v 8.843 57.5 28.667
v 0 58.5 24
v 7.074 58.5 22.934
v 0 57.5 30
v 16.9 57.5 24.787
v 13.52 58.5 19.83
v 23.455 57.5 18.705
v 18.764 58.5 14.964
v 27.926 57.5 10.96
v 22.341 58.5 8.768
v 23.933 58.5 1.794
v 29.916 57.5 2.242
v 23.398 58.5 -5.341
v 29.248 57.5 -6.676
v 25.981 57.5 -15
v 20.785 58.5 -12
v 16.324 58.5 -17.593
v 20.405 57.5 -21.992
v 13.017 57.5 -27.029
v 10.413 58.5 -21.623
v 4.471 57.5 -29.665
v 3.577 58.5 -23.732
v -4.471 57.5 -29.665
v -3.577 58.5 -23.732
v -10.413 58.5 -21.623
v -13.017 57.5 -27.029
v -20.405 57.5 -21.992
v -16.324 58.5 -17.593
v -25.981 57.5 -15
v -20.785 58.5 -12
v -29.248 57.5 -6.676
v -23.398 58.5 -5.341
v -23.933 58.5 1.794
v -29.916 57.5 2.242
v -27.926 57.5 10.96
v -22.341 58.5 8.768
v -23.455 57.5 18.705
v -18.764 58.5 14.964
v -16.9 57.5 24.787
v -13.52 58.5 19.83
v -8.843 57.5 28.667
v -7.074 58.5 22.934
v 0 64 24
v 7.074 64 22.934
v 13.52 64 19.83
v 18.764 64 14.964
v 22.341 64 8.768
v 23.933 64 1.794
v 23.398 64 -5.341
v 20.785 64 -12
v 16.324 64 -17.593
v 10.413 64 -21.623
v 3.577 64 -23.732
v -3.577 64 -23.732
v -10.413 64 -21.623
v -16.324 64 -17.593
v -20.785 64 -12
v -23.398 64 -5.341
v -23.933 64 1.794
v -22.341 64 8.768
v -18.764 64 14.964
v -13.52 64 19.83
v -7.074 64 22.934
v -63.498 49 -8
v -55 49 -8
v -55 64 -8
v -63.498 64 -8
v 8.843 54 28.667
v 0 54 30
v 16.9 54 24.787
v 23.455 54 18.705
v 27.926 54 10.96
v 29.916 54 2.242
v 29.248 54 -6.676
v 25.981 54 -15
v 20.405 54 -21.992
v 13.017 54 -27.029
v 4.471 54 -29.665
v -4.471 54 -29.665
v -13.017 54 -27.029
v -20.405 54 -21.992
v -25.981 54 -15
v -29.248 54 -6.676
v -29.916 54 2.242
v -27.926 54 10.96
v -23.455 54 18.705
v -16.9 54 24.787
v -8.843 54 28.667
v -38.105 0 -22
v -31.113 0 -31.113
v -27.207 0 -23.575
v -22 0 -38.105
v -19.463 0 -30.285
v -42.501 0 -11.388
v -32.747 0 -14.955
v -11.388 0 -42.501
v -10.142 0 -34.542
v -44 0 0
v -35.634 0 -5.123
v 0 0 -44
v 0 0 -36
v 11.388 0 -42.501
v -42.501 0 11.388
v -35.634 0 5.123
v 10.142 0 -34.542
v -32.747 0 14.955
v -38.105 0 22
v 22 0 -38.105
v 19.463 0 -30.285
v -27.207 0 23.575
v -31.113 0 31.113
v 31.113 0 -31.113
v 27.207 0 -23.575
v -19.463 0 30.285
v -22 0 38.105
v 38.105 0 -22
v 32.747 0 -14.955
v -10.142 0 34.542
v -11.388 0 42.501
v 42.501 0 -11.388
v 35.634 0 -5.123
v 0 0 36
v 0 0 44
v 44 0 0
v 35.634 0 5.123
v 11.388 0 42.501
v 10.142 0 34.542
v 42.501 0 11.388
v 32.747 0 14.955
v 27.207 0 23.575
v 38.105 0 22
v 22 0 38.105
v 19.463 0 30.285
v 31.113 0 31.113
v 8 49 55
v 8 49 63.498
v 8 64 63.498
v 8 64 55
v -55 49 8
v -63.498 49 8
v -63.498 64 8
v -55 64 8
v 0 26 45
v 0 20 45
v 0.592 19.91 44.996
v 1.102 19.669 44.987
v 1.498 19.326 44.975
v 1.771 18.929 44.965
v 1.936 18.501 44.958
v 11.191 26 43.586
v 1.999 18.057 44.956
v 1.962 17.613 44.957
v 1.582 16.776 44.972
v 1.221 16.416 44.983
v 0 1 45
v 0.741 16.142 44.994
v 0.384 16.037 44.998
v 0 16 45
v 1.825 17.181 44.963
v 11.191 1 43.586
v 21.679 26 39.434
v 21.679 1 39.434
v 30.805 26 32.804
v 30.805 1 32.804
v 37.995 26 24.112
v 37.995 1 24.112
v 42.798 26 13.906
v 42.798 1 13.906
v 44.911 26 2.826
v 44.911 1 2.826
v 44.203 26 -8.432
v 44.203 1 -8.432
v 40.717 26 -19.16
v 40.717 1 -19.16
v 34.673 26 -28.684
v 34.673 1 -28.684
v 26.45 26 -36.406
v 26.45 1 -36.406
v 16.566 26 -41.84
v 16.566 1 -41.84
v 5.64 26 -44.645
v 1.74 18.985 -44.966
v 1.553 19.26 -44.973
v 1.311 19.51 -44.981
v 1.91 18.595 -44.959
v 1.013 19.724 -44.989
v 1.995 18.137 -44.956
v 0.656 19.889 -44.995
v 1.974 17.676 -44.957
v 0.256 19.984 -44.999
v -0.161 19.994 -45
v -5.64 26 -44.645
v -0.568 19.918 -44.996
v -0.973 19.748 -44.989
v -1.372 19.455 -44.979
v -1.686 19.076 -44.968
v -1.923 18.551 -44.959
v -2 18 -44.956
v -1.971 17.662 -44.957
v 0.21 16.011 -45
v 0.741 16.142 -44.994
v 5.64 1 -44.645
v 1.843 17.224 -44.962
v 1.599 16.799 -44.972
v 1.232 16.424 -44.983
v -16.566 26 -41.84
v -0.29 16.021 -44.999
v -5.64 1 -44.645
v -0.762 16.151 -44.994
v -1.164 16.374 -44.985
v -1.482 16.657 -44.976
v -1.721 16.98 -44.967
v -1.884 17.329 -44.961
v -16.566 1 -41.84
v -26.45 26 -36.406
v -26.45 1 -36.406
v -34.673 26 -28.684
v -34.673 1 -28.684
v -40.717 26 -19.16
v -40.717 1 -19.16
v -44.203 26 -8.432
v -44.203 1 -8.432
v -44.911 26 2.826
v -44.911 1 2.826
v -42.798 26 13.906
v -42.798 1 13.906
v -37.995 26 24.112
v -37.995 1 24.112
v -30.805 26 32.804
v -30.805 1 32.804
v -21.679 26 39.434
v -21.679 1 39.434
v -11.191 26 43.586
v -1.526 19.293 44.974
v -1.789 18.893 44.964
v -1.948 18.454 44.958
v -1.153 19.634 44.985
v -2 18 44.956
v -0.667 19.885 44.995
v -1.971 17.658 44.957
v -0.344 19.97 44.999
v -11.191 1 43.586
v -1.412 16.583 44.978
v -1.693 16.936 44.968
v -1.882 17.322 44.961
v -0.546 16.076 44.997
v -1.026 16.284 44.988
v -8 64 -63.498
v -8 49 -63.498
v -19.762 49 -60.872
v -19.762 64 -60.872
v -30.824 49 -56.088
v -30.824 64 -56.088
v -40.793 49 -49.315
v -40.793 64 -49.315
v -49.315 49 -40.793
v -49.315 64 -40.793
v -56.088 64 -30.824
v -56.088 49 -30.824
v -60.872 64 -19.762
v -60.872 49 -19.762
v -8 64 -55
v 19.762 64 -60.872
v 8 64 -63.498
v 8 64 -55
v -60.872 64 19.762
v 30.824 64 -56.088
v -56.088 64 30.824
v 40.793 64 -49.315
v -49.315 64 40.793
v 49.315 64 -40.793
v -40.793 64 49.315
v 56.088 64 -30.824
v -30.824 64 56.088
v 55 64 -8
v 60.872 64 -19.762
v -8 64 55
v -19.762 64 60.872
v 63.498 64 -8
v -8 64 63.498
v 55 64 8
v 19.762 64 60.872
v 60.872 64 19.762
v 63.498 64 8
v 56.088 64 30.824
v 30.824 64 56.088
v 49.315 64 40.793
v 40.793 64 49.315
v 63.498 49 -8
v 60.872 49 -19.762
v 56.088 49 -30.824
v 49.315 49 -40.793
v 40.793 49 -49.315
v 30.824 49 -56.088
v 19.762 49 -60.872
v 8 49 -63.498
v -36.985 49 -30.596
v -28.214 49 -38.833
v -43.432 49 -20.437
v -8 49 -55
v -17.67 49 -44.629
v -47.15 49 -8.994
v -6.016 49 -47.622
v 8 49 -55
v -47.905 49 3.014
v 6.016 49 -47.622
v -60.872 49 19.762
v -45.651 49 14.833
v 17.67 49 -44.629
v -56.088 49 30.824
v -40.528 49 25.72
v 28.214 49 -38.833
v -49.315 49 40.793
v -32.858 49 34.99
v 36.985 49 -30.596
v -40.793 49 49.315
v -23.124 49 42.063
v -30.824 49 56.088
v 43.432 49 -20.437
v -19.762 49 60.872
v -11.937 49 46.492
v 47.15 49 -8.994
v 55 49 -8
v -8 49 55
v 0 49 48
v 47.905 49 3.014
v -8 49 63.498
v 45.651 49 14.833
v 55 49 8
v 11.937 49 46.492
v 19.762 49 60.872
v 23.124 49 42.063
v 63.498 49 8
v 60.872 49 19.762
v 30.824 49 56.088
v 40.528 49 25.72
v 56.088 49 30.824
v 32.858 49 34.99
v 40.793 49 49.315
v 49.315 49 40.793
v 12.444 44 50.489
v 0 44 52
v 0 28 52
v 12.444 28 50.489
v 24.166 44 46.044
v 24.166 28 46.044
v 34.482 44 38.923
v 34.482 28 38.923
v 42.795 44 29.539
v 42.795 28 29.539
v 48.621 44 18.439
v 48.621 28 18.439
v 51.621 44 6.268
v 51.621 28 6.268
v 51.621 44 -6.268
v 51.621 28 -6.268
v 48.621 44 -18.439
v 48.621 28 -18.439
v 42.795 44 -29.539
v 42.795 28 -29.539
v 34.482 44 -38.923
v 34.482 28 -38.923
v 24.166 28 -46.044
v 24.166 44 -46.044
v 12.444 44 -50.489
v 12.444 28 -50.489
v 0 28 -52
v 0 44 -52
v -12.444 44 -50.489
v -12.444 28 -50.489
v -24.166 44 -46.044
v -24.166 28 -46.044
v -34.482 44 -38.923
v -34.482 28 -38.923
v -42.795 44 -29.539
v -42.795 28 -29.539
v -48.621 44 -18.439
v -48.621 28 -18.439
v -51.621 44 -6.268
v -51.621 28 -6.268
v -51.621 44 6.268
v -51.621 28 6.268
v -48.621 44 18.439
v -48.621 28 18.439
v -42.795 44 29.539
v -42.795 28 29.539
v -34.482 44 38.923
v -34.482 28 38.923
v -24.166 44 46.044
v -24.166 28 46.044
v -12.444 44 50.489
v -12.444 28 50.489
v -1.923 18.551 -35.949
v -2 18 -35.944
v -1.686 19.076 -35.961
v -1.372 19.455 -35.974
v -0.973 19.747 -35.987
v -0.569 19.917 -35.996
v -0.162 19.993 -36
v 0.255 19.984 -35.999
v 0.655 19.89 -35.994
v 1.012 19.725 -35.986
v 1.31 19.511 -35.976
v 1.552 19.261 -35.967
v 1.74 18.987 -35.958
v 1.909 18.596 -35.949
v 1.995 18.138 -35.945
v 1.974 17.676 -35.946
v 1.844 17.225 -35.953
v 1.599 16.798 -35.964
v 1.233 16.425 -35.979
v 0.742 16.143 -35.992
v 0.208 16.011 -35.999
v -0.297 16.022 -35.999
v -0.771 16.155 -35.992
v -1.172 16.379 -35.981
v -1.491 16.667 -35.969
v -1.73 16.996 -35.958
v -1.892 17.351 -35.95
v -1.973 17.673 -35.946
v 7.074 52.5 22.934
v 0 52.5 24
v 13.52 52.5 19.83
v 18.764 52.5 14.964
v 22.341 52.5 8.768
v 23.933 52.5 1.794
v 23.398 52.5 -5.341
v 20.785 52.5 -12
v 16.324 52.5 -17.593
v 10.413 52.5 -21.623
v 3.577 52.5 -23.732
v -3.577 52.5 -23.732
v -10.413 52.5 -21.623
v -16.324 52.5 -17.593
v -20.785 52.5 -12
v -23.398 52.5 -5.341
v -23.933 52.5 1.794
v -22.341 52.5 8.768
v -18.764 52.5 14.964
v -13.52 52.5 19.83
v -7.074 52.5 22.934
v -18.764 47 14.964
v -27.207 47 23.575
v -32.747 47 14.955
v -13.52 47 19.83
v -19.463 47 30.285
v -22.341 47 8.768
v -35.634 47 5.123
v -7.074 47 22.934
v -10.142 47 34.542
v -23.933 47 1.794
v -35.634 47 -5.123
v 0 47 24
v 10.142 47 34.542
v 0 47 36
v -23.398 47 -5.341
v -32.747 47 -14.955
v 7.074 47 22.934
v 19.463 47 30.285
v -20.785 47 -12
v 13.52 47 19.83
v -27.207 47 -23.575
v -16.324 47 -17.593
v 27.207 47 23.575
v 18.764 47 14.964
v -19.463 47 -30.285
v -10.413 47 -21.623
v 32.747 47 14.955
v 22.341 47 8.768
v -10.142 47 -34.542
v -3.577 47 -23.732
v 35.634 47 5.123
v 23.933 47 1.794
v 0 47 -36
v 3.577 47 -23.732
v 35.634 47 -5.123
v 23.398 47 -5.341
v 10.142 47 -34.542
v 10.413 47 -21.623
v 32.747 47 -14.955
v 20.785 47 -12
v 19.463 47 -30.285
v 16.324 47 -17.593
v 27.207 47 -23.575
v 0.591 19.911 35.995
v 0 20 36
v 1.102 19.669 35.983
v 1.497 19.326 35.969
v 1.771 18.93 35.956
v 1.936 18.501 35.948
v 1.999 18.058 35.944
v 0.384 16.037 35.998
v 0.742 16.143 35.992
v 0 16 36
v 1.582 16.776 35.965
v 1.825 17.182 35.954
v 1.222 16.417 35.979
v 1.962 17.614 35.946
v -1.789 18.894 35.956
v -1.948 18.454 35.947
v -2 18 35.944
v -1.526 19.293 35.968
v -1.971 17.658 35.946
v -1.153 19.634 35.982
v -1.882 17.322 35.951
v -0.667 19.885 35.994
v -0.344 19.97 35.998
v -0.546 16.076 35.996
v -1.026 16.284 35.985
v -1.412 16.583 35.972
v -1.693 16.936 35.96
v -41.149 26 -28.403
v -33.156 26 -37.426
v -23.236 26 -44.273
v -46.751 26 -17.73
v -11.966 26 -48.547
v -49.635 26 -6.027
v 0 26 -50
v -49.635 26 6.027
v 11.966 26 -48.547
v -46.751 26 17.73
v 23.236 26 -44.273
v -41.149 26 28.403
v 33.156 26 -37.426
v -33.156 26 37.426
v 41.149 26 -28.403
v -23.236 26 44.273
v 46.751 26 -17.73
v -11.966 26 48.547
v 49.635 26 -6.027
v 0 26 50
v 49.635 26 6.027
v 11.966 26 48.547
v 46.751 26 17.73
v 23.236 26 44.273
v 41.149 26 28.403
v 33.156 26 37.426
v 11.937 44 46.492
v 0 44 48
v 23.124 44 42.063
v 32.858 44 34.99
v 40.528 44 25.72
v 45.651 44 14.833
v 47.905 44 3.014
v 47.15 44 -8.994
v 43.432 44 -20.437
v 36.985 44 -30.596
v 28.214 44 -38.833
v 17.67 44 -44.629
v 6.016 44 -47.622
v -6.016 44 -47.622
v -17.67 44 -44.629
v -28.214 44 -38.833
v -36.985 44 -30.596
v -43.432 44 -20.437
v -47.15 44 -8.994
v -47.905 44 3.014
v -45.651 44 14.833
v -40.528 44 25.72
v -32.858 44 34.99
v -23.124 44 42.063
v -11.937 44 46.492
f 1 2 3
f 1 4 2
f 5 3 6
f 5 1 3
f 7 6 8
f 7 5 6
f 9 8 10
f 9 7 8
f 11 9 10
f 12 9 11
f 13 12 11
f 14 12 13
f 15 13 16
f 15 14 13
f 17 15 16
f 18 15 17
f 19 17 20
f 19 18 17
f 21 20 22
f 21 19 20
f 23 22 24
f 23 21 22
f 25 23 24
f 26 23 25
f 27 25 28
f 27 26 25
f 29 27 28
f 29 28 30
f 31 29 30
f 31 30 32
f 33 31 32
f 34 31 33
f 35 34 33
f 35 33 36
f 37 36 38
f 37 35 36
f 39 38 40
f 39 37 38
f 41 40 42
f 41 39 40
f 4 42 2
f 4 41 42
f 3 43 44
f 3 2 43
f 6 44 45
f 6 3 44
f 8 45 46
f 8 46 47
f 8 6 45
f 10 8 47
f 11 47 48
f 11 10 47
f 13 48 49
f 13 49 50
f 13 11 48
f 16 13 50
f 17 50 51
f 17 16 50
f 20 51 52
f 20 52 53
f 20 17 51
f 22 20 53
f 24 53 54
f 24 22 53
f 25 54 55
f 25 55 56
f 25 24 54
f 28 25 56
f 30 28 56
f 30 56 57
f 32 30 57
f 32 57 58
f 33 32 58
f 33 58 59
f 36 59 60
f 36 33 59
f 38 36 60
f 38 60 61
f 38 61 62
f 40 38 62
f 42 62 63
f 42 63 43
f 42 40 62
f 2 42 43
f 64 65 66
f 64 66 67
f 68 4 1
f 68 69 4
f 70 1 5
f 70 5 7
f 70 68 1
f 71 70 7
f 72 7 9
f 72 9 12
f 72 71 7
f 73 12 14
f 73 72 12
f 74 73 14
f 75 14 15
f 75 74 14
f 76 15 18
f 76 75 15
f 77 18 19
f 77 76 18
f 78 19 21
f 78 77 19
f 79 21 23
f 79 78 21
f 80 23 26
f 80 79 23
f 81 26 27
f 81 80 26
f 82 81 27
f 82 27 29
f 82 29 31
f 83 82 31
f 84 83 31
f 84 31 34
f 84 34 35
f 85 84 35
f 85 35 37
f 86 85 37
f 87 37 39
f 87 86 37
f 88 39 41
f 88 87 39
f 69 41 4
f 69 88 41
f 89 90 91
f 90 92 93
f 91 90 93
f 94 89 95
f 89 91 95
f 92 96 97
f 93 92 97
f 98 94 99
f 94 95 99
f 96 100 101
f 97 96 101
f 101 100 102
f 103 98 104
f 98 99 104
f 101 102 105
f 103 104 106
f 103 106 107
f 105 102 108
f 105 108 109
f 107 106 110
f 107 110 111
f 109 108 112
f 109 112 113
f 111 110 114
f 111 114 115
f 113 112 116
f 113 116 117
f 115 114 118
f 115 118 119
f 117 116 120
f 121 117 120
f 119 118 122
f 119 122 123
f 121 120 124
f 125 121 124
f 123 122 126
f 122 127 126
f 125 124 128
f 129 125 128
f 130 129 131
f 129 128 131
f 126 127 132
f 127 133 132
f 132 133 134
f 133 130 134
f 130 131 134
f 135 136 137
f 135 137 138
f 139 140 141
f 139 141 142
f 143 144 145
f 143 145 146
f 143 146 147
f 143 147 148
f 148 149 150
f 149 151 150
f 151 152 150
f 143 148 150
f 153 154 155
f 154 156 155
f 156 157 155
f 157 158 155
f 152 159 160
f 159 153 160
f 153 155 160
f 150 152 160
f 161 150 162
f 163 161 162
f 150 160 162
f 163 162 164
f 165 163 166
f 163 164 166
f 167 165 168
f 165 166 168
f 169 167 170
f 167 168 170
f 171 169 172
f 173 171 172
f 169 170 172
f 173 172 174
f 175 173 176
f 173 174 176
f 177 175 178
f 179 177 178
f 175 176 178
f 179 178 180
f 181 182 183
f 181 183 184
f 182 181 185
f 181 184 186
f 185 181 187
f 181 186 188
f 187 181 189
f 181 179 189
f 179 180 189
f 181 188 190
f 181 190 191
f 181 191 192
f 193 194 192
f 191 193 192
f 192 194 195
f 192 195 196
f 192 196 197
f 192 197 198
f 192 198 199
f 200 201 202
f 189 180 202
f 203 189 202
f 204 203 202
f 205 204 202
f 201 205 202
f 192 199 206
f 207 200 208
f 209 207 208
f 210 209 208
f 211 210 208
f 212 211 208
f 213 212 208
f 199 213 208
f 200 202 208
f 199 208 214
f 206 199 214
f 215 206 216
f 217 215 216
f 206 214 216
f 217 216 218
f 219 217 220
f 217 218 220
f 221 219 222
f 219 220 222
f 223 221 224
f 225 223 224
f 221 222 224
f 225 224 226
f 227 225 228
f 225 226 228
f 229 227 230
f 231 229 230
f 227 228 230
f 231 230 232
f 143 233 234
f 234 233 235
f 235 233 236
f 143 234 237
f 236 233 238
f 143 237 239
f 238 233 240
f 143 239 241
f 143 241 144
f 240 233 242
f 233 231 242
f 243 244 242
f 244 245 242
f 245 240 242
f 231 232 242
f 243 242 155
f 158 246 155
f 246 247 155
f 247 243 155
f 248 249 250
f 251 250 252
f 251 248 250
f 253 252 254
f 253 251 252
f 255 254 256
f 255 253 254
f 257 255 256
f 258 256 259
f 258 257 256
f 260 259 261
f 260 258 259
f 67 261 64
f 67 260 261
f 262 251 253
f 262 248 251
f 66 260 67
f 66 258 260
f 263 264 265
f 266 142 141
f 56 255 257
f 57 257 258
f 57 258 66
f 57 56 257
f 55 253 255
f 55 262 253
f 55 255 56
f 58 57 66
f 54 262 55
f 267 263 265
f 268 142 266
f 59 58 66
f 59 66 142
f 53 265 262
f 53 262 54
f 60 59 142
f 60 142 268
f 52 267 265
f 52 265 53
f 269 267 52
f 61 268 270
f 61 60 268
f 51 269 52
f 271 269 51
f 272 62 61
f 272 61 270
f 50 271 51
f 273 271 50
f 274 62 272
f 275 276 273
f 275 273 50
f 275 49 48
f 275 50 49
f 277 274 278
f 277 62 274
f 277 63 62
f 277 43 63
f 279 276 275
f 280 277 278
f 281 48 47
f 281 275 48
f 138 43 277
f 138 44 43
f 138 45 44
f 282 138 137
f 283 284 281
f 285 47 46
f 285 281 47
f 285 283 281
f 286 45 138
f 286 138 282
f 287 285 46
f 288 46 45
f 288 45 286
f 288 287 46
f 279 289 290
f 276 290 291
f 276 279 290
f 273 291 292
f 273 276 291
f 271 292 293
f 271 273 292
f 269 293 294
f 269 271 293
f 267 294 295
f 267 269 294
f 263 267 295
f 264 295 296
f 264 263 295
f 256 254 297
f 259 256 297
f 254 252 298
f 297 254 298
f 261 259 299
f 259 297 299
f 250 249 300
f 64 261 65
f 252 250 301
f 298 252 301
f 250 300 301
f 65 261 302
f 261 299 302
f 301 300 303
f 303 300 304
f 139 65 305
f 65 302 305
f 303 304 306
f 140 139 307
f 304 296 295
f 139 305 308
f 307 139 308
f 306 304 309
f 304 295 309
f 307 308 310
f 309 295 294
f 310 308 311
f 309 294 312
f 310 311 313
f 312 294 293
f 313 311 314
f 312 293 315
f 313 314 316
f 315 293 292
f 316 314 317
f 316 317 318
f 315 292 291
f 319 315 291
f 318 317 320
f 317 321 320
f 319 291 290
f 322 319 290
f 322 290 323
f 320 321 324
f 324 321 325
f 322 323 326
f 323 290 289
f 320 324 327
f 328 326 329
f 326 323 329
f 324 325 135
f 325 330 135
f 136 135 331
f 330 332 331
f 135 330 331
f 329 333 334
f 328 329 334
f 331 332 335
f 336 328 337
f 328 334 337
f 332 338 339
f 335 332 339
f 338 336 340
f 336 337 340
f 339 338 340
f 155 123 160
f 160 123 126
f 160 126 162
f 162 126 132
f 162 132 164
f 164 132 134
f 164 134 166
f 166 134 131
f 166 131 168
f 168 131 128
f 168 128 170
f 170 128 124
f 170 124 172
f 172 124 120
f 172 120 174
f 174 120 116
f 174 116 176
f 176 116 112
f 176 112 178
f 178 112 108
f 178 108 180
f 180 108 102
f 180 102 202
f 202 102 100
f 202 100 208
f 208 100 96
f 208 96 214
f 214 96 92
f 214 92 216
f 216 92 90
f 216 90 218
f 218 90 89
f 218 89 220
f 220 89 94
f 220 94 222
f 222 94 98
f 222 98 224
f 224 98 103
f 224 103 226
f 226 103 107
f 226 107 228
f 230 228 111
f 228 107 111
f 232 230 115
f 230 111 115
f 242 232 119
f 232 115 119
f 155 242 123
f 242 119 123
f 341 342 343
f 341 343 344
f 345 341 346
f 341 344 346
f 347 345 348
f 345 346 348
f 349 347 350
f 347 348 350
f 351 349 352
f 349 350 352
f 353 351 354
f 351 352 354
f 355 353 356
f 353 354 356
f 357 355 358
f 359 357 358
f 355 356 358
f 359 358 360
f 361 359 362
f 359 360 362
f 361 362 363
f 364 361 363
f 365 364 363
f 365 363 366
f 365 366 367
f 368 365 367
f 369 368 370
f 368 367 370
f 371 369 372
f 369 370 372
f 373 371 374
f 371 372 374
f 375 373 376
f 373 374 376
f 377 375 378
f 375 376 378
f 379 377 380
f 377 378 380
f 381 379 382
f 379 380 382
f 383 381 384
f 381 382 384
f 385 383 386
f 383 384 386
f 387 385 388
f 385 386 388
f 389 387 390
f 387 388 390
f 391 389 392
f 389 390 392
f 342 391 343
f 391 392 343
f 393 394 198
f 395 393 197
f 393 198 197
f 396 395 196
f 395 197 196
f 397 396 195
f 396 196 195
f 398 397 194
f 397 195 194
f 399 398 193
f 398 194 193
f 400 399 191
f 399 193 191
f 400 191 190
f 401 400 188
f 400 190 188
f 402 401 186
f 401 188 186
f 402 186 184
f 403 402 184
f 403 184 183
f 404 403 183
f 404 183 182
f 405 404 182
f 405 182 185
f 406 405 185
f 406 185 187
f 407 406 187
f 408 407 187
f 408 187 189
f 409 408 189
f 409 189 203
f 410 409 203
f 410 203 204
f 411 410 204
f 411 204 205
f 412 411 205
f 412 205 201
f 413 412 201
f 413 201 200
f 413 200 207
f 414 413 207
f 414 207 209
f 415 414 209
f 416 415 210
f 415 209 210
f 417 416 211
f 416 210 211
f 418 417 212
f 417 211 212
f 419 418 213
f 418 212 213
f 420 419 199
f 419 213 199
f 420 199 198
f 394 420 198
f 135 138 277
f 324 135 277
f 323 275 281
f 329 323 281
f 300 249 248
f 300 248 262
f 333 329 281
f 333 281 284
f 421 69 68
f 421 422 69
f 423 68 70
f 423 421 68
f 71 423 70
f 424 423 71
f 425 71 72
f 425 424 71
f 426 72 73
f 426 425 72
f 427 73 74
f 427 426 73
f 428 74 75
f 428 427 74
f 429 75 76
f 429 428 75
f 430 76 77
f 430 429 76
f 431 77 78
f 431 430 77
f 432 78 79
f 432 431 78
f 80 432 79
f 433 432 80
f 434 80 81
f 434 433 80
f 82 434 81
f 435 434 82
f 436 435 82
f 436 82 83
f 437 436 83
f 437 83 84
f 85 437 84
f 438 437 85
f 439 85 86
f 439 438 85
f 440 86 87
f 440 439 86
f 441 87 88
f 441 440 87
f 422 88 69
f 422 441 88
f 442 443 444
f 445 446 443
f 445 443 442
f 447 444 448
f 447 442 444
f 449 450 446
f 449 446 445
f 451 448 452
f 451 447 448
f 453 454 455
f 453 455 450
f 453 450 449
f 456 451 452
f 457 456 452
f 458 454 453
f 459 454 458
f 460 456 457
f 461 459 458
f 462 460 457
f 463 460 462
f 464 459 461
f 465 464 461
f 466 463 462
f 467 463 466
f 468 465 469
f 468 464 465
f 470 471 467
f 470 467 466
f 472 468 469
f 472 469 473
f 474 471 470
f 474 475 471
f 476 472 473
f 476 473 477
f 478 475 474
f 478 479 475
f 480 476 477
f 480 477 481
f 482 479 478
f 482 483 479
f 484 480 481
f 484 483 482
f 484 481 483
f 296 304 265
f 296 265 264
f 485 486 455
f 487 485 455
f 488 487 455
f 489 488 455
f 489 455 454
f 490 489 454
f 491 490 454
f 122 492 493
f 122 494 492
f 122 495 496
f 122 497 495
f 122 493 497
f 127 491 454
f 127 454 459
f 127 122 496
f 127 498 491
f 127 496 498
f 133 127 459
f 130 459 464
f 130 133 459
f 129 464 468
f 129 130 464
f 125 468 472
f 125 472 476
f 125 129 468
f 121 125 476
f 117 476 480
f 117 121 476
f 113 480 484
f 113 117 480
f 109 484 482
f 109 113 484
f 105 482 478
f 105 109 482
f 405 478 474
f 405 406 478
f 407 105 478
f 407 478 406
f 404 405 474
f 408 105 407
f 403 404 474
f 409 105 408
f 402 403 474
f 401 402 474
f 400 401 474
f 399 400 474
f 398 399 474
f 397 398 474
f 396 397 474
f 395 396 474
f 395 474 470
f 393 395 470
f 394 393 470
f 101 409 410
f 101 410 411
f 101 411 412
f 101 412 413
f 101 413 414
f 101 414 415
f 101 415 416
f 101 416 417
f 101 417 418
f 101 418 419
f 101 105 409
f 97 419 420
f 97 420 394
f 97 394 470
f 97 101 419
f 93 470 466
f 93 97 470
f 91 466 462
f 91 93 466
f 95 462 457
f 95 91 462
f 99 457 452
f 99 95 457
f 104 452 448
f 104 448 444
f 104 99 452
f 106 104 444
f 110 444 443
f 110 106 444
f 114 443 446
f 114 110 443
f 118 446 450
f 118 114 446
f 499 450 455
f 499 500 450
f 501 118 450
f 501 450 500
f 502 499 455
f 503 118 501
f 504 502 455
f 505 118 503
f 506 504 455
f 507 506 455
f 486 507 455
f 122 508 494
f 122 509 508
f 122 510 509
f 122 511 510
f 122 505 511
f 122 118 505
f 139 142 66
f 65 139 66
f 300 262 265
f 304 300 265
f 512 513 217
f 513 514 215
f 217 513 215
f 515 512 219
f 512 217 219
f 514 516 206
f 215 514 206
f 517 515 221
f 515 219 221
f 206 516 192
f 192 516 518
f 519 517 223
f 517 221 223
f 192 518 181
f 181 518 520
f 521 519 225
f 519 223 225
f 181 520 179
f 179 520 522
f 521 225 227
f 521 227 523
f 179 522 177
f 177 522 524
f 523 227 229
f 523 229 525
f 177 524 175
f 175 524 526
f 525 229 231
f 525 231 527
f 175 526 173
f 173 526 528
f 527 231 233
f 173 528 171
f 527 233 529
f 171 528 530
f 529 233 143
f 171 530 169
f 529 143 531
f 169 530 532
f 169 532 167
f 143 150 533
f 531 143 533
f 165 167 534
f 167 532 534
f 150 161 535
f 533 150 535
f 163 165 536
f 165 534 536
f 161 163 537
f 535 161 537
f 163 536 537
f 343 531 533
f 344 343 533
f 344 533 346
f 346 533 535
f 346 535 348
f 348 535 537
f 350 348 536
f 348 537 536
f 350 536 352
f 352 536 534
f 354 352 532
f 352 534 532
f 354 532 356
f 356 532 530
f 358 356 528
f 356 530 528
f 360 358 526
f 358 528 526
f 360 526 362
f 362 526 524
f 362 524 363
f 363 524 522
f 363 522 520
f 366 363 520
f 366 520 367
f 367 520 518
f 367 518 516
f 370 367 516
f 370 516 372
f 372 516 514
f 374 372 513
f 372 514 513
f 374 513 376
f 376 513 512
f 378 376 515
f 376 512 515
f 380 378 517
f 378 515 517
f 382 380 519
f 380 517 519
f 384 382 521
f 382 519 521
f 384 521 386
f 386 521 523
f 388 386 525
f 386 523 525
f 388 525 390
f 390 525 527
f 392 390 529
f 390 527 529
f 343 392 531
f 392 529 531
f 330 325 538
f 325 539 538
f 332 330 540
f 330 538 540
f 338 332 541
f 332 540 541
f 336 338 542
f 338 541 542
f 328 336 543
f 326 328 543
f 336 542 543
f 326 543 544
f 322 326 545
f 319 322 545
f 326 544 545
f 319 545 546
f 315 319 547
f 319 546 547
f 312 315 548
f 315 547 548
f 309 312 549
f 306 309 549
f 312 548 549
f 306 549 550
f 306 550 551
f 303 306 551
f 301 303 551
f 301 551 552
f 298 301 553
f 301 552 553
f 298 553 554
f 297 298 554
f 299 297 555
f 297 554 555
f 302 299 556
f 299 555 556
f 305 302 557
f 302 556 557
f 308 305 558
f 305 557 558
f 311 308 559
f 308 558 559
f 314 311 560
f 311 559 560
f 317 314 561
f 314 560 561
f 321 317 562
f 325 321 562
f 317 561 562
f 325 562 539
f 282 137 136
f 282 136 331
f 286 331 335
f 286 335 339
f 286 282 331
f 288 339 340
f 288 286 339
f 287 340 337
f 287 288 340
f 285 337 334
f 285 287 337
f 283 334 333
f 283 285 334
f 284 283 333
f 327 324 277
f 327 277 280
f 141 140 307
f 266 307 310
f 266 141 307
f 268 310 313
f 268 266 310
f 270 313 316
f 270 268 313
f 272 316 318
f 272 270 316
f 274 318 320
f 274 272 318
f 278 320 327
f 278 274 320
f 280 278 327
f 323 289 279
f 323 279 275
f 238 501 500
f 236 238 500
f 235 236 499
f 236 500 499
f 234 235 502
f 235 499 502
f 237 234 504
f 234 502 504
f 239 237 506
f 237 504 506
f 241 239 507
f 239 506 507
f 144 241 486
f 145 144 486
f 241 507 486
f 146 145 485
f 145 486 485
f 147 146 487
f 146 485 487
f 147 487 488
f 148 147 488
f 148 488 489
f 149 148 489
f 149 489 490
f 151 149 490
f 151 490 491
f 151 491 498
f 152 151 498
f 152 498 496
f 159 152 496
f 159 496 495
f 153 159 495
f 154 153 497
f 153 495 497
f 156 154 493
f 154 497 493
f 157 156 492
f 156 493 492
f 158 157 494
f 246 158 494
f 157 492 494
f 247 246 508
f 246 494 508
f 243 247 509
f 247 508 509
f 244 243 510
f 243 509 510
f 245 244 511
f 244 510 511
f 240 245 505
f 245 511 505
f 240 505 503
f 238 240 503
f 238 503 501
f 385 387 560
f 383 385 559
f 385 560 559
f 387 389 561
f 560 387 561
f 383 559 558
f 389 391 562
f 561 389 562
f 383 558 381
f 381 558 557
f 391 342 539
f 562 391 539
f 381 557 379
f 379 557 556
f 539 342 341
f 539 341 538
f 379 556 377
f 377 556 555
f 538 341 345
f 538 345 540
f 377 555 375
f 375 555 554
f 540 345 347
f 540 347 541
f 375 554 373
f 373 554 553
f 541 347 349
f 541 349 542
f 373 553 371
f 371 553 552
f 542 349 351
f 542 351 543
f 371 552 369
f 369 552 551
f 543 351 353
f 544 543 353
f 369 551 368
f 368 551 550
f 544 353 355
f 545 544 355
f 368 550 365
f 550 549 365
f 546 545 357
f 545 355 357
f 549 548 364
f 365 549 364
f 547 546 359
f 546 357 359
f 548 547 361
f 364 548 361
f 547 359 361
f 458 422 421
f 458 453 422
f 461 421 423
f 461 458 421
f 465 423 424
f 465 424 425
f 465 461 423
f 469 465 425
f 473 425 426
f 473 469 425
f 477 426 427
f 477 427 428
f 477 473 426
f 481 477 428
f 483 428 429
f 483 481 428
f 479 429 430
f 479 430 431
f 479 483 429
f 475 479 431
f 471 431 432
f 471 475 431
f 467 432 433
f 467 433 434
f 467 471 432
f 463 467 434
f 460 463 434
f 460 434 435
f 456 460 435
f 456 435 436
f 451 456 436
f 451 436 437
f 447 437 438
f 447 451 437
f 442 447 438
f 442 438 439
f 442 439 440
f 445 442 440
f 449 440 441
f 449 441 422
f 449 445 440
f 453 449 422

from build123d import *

# Parameters (mm, degrees)
SKETCH_1_W                = 64
SKETCH_1_H                = 15
CUT_EXTRUDE_1_DEPTH       = 92.744209627
CUT_EXTRUDE_2_DEPTH       = 92.744209627
CUT_EXTRUDE_3_DEPTH       = 92.744209627
CUT_EXTRUDE_4_DEPTH       = 92.394748208
HOLE_WIZARD_4_0_4_1_D     = 4
HOLE_WIZARD_4_0_4_1_DEPTH = 27.553629954
HOLE_WIZARD_4_0_4_2_D     = 4
HOLE_WIZARD_4_0_4_2_DEPTH = 108.498031466
CHAMFER_1_SIZE            = 2
CHAMFER_2_SIZE            = 1


with BuildPart() as part:
    # Эскиз1 → Повернуть1 (revolve)
    with BuildSketch(Plane(origin=(0, 0, 0), x_dir=(-1, 0, 0), z_dir=(0, 0, -1)), mode=Mode.PRIVATE) as revolve_1_sk:
        with Locations((-32, 56.5)):
            Rectangle(SKETCH_1_W, SKETCH_1_H)
    revolve(revolve_1_sk.sketch.rotate(Axis((0, 49, 0), (0, 1, 0)), 270), axis=Axis((0, 49, 0), (0, 1, 0)))

    # Эскиз2 → Вырез-Вытянуть1 (cut, through all)
    with BuildSketch(Plane(origin=(0, 64, 0), x_dir=(-1, 0, 0), z_dir=(0, 1, 0))):
        with BuildLine():
            Line((63.498031466, 8), (55, 8))
            Line((55, 8), (55, -8))
            Line((55, -8), (63.498031466, -8))
            ThreePointArc((63.498031466, -8), (64, 0), (63.498031466, 8))
        make_face()
    extrude(amount=-CUT_EXTRUDE_1_DEPTH, mode=Mode.SUBTRACT)

    # Эскиз3 → Вырез-Вытянуть2 (cut, through all)
    with BuildSketch(Plane(origin=(0, 64, 0), x_dir=(-1, 0, 0), z_dir=(0, 1, 0))):
        with BuildLine():
            Line((8, -63.498031466), (8, -55))
            Line((8, -55), (-8, -55))
            Line((-8, -55), (-8, -63.498031466))
            ThreePointArc((-8, -63.498031466), (0, -64), (8, -63.498031466))
        make_face()
    extrude(amount=-CUT_EXTRUDE_2_DEPTH, mode=Mode.SUBTRACT)

    # Эскиз4 → Вырез-Вытянуть3 (cut, through all)
    with BuildSketch(Plane(origin=(0, 64, 0), x_dir=(-1, 0, 0), z_dir=(0, 1, 0))):
        with BuildLine():
            Line((-63.498031466, -8), (-55, -8))
            Line((-55, -8), (-55, 8))
            Line((-55, 8), (-63.498031466, 8))
            ThreePointArc((-63.498031466, 8), (-64, 0), (-63.498031466, -8))
        make_face()
    extrude(amount=-CUT_EXTRUDE_3_DEPTH, mode=Mode.SUBTRACT)

    # Эскиз5 → Вырез-Вытянуть4 (cut, through all)
    with BuildSketch(Plane(origin=(0, 64, 0), x_dir=(-1, 0, 0), z_dir=(0, 1, 0))):
        with BuildLine():
            Line((-8, 63.498031466), (-8, 55))
            Line((-8, 55), (8, 55))
            Line((8, 55), (8, 63.498031466))
            ThreePointArc((8, 63.498031466), (0, 64), (-8, 63.498031466))
        make_face()
    extrude(amount=-CUT_EXTRUDE_4_DEPTH, mode=Mode.SUBTRACT)

    # Эскиз6 → Повернуть2 (revolve)
    with BuildSketch(Plane(origin=(0, 0, 0), x_dir=(-1, 0, 0), z_dir=(0, 0, -1)), mode=Mode.PRIVATE) as revolve_2_sk:
        Polygon((-45, 0), (0, 0), (0, 49), (-48, 49), (-48, 44), (-52, 44), (-52, 26), (-45, 26), align=None)
    revolve(revolve_2_sk.sketch.rotate(Axis((0, 0, 0), (0, 1, 0)), 270), axis=Axis((0, 0, 0), (0, 1, 0)))

    # Эскиз7 → Вырез-Повернуть1 (revolve, cut)
    with BuildSketch(Plane(origin=(0, 0, 0), x_dir=(-1, 0, 0), z_dir=(0, 0, -1)), mode=Mode.PRIVATE) as cut_revolve_1_sk:
        Polygon((-36, 0), (0, 0), (0, 64), (-24, 64), (-24, 58.5), (-30, 57.5), (-30, 54), (-24, 52.5), (-24, 47), (-36, 47), align=None)
    revolve(cut_revolve_1_sk.sketch.rotate(Axis((0, 0, 0), (0, 1, 0)), 270), axis=Axis((0, 0, 0), (0, 1, 0)), mode=Mode.SUBTRACT)

    # Диаметр отверстия Ø4.0 (4)1
    with Locations(Plane.XY.offset(-35.944401511)):
        with Locations((0, 18)):
            Hole(HOLE_WIZARD_4_0_4_1_D / 2, depth=HOLE_WIZARD_4_0_4_1_DEPTH)

    # Диаметр отверстия Ø4.0 (4)2
    with Locations(Plane(origin=(0, 18, 45), x_dir=(1, 0, 0), z_dir=(0, 0, 1))):
        with Locations((0, 0)):
            Hole(HOLE_WIZARD_4_0_4_2_D / 2, depth=HOLE_WIZARD_4_0_4_2_DEPTH)

    # Фаска1
    chamfer_1_edges = [part.edges().sort_by_distance(p)[0] for p in [
        (0, 26, -52),
    ]]
    chamfer(chamfer_1_edges, length=CHAMFER_1_SIZE)

    # Фаска2
    chamfer_2_edges = [part.edges().sort_by_distance(p)[0] for p in [
        (0, 0, -45),
    ]]
    chamfer(chamfer_2_edges, length=CHAMFER_2_SIZE)


solid = part.part
